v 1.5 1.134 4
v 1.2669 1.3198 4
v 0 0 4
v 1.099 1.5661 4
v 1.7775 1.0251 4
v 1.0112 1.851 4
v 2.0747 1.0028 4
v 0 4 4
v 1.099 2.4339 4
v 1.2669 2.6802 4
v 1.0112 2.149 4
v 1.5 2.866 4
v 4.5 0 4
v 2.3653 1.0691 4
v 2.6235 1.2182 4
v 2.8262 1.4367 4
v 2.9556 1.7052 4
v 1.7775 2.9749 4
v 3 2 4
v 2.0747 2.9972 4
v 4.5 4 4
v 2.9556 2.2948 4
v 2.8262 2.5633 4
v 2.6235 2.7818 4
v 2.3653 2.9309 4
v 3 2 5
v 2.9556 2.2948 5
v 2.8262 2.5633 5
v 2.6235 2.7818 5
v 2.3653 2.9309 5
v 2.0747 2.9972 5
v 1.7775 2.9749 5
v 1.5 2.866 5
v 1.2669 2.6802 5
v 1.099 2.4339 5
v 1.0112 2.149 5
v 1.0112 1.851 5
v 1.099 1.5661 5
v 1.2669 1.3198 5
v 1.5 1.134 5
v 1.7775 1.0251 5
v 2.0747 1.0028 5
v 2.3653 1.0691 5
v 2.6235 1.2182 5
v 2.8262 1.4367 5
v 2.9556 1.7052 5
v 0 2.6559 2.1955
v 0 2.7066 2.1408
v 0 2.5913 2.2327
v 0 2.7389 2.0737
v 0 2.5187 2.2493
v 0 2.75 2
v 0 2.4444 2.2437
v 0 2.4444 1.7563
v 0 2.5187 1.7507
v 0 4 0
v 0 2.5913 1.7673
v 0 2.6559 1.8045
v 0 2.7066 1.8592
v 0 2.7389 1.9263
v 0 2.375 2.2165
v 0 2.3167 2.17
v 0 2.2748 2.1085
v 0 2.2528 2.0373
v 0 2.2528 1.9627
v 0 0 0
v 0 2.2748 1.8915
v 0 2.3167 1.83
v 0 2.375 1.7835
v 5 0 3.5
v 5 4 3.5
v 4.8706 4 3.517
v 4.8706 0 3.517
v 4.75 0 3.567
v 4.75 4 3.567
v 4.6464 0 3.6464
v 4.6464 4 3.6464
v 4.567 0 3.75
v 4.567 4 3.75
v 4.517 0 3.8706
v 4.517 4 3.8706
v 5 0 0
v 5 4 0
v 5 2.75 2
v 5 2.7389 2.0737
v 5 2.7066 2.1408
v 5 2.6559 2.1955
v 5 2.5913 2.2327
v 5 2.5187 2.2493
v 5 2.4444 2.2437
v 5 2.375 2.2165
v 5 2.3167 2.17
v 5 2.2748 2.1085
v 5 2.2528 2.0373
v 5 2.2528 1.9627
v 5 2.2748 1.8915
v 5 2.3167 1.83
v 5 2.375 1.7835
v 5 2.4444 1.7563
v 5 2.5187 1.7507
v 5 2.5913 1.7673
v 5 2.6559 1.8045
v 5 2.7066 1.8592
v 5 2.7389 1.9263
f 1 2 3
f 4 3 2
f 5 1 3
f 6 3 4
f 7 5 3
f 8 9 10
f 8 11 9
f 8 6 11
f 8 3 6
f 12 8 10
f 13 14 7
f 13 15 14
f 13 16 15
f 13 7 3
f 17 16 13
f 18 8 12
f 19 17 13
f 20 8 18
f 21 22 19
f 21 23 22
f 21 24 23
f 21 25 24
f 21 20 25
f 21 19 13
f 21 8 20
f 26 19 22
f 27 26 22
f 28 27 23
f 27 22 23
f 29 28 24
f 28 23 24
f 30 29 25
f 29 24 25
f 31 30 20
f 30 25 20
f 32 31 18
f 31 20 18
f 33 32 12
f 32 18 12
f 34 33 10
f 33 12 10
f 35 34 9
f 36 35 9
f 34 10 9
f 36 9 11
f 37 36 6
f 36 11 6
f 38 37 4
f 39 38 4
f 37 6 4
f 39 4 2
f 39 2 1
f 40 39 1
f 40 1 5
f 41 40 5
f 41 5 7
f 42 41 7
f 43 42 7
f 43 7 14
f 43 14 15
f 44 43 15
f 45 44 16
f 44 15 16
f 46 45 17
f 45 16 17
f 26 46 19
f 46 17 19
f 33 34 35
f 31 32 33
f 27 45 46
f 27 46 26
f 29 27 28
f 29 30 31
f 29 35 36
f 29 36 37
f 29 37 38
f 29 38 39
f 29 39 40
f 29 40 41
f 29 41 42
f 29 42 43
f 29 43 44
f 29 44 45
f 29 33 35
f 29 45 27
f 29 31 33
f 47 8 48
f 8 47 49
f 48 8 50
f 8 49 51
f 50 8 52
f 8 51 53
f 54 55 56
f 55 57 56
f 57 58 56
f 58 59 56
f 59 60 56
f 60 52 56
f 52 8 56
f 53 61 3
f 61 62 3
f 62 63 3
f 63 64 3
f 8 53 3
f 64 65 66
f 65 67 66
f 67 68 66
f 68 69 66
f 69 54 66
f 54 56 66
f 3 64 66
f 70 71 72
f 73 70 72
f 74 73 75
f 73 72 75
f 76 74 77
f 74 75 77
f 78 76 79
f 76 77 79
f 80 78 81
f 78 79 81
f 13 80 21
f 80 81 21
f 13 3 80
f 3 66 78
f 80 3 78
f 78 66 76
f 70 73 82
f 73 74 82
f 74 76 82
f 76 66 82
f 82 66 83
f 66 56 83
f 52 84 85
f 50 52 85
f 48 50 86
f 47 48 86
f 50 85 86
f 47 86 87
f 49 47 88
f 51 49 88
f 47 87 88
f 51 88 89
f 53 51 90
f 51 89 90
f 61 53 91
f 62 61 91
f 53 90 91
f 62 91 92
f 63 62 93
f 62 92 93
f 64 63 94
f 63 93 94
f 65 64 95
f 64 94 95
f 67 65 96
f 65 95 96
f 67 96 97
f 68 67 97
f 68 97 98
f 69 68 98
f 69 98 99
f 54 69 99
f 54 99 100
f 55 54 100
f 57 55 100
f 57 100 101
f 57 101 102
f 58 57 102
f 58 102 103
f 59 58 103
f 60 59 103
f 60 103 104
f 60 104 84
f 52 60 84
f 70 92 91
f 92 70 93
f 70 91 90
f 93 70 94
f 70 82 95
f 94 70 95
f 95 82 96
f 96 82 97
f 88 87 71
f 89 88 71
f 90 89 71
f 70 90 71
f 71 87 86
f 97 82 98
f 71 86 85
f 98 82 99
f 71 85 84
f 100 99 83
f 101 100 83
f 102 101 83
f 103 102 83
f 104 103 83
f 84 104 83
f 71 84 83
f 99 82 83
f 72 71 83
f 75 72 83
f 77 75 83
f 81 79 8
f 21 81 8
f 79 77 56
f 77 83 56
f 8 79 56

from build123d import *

# Parameters (mm, degrees)
F1_DEPTH = 4
F3_DEPTH = 1
F4_R     = 0.5
F5_DEPTH = 4
F6_R     = 0.25
F7_DEPTH = 25


with BuildPart() as f1:
    # F0 (on Top) → F1 (new body)
    with BuildSketch(Plane.XY):
        Polygon((0, 2), (0, 0), (5, 0), (5, 4), (2, 4), (0, 4), align=None)
    extrude(amount=F1_DEPTH)

    # F2 (on face) → F3 (join)
    with BuildSketch(Plane.XY.offset(4)):
        with BuildLine():
            ThreePointArc((1, 2), (2, 1), (3, 2))
            ThreePointArc((3, 2), (2, 3), (1, 2))
        make_face()
    extrude(amount=F3_DEPTH)

    # F4 (on face) → F5 (cut)
    with BuildSketch(Plane(origin=(0, 4, 0), x_dir=(-1, 0, 0), z_dir=(0, 1, 0))):
        with Locations((-5, 4)):
            Circle(F4_R)
    extrude(amount=-F5_DEPTH, mode=Mode.SUBTRACT)

    # F6 (on face) → F7 (cut)
    with BuildSketch(Plane.YZ.offset(5)):
        with Locations((2.5, 2)):
            Circle(F6_R)
    extrude(amount=-F7_DEPTH, mode=Mode.SUBTRACT)


solid = f1.part
